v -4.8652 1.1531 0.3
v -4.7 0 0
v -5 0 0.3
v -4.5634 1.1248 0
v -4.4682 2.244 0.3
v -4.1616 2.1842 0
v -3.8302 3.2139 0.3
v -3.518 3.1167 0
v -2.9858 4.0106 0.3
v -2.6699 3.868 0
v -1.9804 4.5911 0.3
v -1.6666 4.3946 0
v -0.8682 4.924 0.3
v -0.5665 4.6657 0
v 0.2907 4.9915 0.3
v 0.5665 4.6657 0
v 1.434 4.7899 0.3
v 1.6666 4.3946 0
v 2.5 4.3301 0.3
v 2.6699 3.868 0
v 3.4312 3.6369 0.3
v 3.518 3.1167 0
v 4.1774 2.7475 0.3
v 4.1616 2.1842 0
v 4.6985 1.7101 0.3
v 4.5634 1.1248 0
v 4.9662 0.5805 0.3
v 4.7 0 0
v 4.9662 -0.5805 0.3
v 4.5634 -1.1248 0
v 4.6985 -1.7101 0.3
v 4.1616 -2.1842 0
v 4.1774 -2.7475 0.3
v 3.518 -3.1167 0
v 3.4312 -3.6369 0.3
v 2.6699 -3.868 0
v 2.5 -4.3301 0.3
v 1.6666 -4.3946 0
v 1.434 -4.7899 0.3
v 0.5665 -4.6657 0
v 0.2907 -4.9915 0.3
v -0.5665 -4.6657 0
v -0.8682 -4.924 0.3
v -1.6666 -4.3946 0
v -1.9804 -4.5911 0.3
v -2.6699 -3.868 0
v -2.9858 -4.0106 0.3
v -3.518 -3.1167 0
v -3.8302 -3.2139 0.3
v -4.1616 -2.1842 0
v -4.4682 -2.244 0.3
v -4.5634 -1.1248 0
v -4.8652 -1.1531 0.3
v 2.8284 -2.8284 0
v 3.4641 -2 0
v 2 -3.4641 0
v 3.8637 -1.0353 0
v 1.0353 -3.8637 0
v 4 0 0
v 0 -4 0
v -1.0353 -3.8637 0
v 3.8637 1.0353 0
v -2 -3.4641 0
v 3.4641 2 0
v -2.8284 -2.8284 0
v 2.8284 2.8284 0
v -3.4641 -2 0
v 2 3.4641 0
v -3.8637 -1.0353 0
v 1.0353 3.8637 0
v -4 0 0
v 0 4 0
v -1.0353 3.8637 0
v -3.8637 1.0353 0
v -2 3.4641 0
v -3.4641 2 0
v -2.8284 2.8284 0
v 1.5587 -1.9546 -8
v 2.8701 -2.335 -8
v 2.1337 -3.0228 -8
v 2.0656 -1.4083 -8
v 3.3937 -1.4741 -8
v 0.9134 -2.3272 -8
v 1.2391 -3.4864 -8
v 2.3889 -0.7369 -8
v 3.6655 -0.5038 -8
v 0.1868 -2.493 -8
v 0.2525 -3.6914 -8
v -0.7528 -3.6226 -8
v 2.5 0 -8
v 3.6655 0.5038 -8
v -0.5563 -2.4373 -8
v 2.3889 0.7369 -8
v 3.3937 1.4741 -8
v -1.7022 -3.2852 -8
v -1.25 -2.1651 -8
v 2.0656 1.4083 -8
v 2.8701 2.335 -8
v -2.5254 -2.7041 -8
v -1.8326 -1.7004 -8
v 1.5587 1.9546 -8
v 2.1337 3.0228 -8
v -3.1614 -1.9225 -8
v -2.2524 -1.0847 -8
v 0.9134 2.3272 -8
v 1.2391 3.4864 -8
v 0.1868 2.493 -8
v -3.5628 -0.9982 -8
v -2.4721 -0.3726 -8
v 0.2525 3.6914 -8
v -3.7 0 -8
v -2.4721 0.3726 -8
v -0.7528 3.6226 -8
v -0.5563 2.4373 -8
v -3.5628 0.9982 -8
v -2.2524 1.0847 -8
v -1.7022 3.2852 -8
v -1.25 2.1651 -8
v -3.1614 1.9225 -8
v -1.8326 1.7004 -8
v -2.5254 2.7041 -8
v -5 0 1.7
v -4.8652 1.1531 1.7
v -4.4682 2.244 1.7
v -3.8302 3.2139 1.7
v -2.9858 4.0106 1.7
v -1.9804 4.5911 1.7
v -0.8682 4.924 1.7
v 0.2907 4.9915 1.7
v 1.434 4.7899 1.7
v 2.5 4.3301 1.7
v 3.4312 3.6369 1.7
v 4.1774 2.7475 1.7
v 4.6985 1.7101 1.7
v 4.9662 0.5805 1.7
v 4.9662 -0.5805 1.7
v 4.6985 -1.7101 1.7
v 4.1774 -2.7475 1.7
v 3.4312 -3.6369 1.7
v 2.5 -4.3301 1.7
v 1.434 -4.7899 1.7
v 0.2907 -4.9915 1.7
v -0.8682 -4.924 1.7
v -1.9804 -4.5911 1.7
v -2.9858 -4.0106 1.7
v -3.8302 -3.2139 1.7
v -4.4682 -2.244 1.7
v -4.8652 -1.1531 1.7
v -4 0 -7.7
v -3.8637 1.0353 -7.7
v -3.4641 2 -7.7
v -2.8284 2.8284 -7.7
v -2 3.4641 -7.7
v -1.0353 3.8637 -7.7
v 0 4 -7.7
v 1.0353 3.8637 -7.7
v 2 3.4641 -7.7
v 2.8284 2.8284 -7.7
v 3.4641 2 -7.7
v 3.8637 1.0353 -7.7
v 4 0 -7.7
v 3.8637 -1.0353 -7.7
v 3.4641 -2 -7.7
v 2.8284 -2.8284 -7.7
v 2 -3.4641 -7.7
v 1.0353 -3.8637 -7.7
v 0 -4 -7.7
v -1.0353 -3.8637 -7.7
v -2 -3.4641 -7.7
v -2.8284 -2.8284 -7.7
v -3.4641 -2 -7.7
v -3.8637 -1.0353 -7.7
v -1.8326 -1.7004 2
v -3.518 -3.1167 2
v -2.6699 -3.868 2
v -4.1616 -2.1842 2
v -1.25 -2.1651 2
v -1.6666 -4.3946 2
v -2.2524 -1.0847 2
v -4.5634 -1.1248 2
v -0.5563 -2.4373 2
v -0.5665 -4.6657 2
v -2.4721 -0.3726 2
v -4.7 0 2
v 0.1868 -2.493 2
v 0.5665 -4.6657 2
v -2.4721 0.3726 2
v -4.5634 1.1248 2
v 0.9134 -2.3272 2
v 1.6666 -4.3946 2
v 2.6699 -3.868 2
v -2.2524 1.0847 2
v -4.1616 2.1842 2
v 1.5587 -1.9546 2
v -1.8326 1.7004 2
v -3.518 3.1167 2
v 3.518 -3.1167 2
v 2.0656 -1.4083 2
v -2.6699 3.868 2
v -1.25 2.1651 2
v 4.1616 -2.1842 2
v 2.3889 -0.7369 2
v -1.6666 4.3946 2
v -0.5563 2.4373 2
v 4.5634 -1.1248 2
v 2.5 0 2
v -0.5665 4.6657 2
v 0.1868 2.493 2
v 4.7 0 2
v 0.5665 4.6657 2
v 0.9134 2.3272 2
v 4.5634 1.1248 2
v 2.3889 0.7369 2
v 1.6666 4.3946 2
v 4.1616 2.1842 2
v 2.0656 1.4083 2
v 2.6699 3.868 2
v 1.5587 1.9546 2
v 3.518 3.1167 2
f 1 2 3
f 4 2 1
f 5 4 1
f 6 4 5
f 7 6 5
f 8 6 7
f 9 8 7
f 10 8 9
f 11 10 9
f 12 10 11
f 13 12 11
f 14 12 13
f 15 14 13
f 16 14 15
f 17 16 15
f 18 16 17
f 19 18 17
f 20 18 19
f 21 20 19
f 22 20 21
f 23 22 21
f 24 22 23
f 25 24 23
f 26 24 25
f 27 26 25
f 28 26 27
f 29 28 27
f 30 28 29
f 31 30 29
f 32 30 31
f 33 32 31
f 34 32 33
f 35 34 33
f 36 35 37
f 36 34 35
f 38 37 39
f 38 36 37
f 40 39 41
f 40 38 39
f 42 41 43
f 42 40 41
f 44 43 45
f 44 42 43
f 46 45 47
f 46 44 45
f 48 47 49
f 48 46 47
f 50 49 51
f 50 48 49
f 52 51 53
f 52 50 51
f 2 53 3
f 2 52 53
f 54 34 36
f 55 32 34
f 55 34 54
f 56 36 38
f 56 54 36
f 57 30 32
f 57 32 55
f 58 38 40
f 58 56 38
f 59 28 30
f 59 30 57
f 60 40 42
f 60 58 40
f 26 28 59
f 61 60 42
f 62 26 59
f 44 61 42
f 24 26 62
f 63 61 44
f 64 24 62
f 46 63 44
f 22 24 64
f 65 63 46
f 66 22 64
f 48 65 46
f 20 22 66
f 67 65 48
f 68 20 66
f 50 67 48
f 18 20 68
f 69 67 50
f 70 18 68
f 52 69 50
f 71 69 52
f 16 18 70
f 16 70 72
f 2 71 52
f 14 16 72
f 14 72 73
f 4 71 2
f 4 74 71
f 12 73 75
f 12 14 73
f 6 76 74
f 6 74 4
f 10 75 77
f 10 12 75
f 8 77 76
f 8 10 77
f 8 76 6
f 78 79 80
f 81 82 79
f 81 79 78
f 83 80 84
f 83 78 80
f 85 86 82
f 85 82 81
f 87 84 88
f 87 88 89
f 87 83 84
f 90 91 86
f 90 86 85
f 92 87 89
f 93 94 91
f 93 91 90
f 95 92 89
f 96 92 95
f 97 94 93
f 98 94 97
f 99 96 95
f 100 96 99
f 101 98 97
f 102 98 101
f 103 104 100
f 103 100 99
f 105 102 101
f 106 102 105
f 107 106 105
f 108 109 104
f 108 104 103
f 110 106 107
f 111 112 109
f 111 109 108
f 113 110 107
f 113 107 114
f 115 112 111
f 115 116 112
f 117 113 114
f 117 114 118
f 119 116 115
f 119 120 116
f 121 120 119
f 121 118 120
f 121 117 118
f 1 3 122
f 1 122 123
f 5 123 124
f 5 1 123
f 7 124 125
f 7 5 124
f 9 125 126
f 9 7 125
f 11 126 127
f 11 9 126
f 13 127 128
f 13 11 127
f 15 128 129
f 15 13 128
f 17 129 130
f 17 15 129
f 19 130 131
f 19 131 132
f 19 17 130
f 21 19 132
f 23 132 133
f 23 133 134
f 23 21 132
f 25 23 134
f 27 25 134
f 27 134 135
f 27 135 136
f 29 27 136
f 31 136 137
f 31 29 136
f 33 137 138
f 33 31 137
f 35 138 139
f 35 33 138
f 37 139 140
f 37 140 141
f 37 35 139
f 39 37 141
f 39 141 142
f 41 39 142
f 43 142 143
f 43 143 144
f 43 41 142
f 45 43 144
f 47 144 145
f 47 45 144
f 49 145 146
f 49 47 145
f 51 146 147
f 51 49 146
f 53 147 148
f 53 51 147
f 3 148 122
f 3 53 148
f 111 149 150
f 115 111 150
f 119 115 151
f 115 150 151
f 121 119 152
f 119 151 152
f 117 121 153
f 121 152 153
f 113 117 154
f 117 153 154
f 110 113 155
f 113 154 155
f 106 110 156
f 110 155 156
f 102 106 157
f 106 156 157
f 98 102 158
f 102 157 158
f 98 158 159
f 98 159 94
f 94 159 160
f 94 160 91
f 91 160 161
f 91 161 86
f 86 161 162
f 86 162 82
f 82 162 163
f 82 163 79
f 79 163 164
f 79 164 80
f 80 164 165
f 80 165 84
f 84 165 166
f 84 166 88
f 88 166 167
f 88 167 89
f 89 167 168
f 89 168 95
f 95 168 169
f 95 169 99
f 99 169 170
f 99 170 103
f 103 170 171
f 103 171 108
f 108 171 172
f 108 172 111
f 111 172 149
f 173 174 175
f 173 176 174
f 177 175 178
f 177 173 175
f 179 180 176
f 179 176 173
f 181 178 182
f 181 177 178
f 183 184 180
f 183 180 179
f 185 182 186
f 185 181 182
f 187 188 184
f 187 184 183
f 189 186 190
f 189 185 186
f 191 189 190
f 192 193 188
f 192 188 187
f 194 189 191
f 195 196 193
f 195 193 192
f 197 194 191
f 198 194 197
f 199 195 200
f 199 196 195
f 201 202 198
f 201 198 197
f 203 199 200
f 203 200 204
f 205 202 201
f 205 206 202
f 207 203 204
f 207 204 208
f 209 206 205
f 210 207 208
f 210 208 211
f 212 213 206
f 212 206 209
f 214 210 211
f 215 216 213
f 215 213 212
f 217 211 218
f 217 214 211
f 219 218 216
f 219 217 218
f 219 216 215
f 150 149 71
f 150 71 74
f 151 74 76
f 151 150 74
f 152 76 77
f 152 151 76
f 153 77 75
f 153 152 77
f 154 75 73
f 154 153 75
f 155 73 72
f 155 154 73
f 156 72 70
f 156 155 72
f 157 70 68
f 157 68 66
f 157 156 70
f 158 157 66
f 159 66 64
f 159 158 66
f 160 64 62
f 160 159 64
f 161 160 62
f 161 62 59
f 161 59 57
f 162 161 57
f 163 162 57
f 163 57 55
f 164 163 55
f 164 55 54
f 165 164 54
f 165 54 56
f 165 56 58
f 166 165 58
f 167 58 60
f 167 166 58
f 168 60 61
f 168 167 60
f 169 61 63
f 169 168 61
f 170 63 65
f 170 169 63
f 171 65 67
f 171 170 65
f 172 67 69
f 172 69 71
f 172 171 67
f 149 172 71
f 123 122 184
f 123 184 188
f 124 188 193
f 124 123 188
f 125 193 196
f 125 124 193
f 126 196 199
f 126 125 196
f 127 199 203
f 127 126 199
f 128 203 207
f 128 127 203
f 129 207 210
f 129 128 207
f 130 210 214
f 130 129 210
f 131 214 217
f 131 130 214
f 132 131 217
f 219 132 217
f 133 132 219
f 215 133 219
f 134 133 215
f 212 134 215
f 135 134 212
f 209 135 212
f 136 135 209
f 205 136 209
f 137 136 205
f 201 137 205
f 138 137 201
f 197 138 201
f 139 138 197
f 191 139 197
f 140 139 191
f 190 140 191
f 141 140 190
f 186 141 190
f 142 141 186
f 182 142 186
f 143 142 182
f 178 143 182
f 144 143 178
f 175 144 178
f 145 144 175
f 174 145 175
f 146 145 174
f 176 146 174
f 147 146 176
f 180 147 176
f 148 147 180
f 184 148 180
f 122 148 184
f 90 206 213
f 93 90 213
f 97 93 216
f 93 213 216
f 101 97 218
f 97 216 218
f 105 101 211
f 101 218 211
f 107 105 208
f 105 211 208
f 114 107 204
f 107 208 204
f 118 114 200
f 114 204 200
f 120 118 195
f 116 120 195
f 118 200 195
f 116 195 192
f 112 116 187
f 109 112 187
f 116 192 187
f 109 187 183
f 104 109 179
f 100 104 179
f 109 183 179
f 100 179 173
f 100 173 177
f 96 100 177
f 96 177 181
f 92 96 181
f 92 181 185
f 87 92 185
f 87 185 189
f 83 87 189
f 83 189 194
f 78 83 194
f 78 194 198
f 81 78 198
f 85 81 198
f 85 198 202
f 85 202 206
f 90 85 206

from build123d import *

# Parameters (mm, degrees)
F2_R     = 2.5
F3_DEPTH = 10.001
F4_SIZE  = 0.3


with BuildPart() as f1:
    # F0 (on Front) → F1 (revolve)
    with BuildSketch(Plane.XZ):
        Polygon((0, 0), (0, 2), (-5, 2), (-5, 0), (-4, 0), (-4, -8), (0, -8), align=None)
    revolve(axis=Axis((0, 0, 0.636387), (0, 0, -1)))

    # F2 (on face) → F3 (cut, through all)
    with BuildSketch(Plane.XY.offset(2)):
        Circle(F2_R)
    extrude(amount=-F3_DEPTH, mode=Mode.SUBTRACT)

    # F4
    f4_edges = [f1.edges().sort_by_distance(p)[0] for p in [
        (5, 0, 2),
        (5, 0, 0),
        (4, 0, -8),
    ]]
    chamfer(f4_edges, length=F4_SIZE)


solid = f1.part
